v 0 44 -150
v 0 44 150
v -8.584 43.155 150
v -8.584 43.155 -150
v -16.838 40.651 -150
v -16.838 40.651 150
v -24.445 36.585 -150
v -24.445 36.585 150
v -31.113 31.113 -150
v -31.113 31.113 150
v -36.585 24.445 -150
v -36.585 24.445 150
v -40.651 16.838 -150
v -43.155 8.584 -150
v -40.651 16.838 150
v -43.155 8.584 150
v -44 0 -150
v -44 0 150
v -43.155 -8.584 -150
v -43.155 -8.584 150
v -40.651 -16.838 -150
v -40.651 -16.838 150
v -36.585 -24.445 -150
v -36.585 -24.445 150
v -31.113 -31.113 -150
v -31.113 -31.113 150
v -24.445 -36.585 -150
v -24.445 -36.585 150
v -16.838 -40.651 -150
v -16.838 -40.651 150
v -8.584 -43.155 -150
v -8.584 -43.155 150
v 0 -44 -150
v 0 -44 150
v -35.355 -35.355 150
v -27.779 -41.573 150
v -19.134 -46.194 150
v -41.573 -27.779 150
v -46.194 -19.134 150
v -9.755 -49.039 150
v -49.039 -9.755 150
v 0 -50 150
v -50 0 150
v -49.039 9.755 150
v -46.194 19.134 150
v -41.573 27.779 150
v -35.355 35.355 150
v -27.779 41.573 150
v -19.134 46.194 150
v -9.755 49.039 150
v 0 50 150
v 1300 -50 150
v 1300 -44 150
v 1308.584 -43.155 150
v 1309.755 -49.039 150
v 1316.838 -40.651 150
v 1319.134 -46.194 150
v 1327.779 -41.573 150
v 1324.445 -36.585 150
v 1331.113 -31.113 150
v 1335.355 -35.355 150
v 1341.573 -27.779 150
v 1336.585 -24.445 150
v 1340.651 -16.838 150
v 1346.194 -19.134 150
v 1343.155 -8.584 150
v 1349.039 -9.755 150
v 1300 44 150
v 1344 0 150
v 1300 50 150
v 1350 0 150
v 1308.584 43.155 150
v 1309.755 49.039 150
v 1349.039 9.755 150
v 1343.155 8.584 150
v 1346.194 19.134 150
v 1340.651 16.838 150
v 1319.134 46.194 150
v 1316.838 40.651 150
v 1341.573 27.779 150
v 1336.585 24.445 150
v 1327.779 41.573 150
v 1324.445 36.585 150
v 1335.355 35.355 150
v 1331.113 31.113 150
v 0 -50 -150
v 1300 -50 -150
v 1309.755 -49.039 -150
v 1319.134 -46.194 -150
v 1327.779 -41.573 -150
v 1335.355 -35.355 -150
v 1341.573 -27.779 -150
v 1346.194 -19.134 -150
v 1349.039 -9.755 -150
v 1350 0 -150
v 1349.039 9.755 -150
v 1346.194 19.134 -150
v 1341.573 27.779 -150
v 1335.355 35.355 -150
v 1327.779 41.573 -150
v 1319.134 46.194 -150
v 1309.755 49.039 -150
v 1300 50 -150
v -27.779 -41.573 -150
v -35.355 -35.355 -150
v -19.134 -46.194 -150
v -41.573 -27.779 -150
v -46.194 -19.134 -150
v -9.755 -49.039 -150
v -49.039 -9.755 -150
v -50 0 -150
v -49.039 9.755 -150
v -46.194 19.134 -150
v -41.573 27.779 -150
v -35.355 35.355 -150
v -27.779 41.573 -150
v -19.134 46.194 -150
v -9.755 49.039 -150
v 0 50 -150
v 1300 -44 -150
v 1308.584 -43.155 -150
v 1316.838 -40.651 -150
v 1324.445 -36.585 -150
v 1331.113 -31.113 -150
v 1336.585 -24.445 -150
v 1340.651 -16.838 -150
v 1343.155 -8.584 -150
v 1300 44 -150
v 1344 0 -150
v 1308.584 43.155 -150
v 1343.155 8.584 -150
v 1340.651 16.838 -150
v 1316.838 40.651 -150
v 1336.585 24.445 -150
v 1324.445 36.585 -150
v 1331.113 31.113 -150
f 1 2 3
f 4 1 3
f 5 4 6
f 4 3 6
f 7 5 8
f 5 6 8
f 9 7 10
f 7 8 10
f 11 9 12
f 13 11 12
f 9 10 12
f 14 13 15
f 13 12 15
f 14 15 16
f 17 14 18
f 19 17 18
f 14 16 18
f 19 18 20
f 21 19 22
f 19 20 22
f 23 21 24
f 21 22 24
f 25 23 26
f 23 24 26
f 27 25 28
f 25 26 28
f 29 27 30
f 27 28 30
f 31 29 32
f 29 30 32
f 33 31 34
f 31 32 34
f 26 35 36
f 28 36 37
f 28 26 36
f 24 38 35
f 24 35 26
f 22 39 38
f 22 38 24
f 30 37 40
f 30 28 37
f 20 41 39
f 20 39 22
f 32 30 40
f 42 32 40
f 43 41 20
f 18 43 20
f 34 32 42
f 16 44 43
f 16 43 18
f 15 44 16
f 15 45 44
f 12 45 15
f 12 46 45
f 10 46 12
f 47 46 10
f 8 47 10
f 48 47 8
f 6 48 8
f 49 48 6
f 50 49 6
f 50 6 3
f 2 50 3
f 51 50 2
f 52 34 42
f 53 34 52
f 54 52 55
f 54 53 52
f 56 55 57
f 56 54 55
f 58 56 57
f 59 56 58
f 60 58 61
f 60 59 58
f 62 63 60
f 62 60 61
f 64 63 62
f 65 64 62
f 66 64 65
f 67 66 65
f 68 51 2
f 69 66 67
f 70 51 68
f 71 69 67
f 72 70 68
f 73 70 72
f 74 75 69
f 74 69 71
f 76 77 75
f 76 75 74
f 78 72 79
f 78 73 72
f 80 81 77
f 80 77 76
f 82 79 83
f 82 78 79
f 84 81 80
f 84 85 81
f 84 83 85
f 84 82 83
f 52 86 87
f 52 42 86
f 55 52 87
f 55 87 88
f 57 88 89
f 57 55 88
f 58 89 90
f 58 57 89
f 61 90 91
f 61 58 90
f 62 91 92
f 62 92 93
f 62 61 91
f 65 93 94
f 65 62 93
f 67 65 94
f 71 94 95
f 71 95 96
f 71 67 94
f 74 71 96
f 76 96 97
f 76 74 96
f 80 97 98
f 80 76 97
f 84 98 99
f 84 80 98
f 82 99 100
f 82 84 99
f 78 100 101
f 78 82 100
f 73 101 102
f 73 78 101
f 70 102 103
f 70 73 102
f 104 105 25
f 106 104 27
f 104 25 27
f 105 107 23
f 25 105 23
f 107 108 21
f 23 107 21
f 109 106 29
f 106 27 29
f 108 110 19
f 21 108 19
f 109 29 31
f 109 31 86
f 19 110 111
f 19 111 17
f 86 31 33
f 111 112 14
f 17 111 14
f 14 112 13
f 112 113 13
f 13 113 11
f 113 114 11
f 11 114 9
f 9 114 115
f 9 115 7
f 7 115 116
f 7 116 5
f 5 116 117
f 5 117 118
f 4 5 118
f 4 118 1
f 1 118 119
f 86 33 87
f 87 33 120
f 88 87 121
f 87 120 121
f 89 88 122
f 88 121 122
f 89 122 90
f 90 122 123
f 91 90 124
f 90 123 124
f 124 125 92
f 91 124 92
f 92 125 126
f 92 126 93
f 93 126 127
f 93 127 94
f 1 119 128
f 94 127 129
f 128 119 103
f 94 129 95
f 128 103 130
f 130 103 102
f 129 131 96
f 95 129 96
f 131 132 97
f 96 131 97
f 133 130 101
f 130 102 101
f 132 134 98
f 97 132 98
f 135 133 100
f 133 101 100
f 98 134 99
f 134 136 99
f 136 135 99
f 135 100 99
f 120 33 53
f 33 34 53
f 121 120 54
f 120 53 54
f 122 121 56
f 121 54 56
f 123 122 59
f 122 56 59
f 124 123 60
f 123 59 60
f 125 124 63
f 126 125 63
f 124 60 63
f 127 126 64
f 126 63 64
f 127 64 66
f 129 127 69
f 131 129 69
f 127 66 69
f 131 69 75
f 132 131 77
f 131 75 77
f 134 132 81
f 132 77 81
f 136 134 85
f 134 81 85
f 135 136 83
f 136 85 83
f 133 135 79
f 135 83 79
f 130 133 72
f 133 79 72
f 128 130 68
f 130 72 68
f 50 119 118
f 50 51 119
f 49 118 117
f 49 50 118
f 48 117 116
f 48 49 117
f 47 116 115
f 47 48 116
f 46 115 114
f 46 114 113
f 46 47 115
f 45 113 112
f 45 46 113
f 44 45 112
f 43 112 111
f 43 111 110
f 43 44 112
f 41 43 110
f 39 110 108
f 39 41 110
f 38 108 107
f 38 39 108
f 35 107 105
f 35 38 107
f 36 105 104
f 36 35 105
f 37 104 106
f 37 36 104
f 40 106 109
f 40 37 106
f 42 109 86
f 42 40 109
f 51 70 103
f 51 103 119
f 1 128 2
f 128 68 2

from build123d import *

# Parameters (mm, degrees)
BOSS_EXTRUDE1_DEPTH = 150


with BuildPart() as part:
    # Sketch1 → Boss-Extrude1 (new, symmetric)
    with BuildSketch(Plane.XY):
        with BuildLine():
            Line((0, -50), (1300, -50))
            ThreePointArc((1300, -50), (1350, 0), (1300, 50))
            Line((1300, 50), (0, 50))
            ThreePointArc((0, 50), (-50, 0), (0, -50))
        make_face()
        with BuildLine():
            ThreePointArc((0, 44), (-44, 0), (0, -44))
            Line((0, -44), (1300, -44))
            ThreePointArc((1300, -44), (1344, 0), (1300, 44))
            Line((1300, 44), (0, 44))
        make_face(mode=Mode.SUBTRACT)
    extrude(amount=BOSS_EXTRUDE1_DEPTH, both=True)


solid = part.part
